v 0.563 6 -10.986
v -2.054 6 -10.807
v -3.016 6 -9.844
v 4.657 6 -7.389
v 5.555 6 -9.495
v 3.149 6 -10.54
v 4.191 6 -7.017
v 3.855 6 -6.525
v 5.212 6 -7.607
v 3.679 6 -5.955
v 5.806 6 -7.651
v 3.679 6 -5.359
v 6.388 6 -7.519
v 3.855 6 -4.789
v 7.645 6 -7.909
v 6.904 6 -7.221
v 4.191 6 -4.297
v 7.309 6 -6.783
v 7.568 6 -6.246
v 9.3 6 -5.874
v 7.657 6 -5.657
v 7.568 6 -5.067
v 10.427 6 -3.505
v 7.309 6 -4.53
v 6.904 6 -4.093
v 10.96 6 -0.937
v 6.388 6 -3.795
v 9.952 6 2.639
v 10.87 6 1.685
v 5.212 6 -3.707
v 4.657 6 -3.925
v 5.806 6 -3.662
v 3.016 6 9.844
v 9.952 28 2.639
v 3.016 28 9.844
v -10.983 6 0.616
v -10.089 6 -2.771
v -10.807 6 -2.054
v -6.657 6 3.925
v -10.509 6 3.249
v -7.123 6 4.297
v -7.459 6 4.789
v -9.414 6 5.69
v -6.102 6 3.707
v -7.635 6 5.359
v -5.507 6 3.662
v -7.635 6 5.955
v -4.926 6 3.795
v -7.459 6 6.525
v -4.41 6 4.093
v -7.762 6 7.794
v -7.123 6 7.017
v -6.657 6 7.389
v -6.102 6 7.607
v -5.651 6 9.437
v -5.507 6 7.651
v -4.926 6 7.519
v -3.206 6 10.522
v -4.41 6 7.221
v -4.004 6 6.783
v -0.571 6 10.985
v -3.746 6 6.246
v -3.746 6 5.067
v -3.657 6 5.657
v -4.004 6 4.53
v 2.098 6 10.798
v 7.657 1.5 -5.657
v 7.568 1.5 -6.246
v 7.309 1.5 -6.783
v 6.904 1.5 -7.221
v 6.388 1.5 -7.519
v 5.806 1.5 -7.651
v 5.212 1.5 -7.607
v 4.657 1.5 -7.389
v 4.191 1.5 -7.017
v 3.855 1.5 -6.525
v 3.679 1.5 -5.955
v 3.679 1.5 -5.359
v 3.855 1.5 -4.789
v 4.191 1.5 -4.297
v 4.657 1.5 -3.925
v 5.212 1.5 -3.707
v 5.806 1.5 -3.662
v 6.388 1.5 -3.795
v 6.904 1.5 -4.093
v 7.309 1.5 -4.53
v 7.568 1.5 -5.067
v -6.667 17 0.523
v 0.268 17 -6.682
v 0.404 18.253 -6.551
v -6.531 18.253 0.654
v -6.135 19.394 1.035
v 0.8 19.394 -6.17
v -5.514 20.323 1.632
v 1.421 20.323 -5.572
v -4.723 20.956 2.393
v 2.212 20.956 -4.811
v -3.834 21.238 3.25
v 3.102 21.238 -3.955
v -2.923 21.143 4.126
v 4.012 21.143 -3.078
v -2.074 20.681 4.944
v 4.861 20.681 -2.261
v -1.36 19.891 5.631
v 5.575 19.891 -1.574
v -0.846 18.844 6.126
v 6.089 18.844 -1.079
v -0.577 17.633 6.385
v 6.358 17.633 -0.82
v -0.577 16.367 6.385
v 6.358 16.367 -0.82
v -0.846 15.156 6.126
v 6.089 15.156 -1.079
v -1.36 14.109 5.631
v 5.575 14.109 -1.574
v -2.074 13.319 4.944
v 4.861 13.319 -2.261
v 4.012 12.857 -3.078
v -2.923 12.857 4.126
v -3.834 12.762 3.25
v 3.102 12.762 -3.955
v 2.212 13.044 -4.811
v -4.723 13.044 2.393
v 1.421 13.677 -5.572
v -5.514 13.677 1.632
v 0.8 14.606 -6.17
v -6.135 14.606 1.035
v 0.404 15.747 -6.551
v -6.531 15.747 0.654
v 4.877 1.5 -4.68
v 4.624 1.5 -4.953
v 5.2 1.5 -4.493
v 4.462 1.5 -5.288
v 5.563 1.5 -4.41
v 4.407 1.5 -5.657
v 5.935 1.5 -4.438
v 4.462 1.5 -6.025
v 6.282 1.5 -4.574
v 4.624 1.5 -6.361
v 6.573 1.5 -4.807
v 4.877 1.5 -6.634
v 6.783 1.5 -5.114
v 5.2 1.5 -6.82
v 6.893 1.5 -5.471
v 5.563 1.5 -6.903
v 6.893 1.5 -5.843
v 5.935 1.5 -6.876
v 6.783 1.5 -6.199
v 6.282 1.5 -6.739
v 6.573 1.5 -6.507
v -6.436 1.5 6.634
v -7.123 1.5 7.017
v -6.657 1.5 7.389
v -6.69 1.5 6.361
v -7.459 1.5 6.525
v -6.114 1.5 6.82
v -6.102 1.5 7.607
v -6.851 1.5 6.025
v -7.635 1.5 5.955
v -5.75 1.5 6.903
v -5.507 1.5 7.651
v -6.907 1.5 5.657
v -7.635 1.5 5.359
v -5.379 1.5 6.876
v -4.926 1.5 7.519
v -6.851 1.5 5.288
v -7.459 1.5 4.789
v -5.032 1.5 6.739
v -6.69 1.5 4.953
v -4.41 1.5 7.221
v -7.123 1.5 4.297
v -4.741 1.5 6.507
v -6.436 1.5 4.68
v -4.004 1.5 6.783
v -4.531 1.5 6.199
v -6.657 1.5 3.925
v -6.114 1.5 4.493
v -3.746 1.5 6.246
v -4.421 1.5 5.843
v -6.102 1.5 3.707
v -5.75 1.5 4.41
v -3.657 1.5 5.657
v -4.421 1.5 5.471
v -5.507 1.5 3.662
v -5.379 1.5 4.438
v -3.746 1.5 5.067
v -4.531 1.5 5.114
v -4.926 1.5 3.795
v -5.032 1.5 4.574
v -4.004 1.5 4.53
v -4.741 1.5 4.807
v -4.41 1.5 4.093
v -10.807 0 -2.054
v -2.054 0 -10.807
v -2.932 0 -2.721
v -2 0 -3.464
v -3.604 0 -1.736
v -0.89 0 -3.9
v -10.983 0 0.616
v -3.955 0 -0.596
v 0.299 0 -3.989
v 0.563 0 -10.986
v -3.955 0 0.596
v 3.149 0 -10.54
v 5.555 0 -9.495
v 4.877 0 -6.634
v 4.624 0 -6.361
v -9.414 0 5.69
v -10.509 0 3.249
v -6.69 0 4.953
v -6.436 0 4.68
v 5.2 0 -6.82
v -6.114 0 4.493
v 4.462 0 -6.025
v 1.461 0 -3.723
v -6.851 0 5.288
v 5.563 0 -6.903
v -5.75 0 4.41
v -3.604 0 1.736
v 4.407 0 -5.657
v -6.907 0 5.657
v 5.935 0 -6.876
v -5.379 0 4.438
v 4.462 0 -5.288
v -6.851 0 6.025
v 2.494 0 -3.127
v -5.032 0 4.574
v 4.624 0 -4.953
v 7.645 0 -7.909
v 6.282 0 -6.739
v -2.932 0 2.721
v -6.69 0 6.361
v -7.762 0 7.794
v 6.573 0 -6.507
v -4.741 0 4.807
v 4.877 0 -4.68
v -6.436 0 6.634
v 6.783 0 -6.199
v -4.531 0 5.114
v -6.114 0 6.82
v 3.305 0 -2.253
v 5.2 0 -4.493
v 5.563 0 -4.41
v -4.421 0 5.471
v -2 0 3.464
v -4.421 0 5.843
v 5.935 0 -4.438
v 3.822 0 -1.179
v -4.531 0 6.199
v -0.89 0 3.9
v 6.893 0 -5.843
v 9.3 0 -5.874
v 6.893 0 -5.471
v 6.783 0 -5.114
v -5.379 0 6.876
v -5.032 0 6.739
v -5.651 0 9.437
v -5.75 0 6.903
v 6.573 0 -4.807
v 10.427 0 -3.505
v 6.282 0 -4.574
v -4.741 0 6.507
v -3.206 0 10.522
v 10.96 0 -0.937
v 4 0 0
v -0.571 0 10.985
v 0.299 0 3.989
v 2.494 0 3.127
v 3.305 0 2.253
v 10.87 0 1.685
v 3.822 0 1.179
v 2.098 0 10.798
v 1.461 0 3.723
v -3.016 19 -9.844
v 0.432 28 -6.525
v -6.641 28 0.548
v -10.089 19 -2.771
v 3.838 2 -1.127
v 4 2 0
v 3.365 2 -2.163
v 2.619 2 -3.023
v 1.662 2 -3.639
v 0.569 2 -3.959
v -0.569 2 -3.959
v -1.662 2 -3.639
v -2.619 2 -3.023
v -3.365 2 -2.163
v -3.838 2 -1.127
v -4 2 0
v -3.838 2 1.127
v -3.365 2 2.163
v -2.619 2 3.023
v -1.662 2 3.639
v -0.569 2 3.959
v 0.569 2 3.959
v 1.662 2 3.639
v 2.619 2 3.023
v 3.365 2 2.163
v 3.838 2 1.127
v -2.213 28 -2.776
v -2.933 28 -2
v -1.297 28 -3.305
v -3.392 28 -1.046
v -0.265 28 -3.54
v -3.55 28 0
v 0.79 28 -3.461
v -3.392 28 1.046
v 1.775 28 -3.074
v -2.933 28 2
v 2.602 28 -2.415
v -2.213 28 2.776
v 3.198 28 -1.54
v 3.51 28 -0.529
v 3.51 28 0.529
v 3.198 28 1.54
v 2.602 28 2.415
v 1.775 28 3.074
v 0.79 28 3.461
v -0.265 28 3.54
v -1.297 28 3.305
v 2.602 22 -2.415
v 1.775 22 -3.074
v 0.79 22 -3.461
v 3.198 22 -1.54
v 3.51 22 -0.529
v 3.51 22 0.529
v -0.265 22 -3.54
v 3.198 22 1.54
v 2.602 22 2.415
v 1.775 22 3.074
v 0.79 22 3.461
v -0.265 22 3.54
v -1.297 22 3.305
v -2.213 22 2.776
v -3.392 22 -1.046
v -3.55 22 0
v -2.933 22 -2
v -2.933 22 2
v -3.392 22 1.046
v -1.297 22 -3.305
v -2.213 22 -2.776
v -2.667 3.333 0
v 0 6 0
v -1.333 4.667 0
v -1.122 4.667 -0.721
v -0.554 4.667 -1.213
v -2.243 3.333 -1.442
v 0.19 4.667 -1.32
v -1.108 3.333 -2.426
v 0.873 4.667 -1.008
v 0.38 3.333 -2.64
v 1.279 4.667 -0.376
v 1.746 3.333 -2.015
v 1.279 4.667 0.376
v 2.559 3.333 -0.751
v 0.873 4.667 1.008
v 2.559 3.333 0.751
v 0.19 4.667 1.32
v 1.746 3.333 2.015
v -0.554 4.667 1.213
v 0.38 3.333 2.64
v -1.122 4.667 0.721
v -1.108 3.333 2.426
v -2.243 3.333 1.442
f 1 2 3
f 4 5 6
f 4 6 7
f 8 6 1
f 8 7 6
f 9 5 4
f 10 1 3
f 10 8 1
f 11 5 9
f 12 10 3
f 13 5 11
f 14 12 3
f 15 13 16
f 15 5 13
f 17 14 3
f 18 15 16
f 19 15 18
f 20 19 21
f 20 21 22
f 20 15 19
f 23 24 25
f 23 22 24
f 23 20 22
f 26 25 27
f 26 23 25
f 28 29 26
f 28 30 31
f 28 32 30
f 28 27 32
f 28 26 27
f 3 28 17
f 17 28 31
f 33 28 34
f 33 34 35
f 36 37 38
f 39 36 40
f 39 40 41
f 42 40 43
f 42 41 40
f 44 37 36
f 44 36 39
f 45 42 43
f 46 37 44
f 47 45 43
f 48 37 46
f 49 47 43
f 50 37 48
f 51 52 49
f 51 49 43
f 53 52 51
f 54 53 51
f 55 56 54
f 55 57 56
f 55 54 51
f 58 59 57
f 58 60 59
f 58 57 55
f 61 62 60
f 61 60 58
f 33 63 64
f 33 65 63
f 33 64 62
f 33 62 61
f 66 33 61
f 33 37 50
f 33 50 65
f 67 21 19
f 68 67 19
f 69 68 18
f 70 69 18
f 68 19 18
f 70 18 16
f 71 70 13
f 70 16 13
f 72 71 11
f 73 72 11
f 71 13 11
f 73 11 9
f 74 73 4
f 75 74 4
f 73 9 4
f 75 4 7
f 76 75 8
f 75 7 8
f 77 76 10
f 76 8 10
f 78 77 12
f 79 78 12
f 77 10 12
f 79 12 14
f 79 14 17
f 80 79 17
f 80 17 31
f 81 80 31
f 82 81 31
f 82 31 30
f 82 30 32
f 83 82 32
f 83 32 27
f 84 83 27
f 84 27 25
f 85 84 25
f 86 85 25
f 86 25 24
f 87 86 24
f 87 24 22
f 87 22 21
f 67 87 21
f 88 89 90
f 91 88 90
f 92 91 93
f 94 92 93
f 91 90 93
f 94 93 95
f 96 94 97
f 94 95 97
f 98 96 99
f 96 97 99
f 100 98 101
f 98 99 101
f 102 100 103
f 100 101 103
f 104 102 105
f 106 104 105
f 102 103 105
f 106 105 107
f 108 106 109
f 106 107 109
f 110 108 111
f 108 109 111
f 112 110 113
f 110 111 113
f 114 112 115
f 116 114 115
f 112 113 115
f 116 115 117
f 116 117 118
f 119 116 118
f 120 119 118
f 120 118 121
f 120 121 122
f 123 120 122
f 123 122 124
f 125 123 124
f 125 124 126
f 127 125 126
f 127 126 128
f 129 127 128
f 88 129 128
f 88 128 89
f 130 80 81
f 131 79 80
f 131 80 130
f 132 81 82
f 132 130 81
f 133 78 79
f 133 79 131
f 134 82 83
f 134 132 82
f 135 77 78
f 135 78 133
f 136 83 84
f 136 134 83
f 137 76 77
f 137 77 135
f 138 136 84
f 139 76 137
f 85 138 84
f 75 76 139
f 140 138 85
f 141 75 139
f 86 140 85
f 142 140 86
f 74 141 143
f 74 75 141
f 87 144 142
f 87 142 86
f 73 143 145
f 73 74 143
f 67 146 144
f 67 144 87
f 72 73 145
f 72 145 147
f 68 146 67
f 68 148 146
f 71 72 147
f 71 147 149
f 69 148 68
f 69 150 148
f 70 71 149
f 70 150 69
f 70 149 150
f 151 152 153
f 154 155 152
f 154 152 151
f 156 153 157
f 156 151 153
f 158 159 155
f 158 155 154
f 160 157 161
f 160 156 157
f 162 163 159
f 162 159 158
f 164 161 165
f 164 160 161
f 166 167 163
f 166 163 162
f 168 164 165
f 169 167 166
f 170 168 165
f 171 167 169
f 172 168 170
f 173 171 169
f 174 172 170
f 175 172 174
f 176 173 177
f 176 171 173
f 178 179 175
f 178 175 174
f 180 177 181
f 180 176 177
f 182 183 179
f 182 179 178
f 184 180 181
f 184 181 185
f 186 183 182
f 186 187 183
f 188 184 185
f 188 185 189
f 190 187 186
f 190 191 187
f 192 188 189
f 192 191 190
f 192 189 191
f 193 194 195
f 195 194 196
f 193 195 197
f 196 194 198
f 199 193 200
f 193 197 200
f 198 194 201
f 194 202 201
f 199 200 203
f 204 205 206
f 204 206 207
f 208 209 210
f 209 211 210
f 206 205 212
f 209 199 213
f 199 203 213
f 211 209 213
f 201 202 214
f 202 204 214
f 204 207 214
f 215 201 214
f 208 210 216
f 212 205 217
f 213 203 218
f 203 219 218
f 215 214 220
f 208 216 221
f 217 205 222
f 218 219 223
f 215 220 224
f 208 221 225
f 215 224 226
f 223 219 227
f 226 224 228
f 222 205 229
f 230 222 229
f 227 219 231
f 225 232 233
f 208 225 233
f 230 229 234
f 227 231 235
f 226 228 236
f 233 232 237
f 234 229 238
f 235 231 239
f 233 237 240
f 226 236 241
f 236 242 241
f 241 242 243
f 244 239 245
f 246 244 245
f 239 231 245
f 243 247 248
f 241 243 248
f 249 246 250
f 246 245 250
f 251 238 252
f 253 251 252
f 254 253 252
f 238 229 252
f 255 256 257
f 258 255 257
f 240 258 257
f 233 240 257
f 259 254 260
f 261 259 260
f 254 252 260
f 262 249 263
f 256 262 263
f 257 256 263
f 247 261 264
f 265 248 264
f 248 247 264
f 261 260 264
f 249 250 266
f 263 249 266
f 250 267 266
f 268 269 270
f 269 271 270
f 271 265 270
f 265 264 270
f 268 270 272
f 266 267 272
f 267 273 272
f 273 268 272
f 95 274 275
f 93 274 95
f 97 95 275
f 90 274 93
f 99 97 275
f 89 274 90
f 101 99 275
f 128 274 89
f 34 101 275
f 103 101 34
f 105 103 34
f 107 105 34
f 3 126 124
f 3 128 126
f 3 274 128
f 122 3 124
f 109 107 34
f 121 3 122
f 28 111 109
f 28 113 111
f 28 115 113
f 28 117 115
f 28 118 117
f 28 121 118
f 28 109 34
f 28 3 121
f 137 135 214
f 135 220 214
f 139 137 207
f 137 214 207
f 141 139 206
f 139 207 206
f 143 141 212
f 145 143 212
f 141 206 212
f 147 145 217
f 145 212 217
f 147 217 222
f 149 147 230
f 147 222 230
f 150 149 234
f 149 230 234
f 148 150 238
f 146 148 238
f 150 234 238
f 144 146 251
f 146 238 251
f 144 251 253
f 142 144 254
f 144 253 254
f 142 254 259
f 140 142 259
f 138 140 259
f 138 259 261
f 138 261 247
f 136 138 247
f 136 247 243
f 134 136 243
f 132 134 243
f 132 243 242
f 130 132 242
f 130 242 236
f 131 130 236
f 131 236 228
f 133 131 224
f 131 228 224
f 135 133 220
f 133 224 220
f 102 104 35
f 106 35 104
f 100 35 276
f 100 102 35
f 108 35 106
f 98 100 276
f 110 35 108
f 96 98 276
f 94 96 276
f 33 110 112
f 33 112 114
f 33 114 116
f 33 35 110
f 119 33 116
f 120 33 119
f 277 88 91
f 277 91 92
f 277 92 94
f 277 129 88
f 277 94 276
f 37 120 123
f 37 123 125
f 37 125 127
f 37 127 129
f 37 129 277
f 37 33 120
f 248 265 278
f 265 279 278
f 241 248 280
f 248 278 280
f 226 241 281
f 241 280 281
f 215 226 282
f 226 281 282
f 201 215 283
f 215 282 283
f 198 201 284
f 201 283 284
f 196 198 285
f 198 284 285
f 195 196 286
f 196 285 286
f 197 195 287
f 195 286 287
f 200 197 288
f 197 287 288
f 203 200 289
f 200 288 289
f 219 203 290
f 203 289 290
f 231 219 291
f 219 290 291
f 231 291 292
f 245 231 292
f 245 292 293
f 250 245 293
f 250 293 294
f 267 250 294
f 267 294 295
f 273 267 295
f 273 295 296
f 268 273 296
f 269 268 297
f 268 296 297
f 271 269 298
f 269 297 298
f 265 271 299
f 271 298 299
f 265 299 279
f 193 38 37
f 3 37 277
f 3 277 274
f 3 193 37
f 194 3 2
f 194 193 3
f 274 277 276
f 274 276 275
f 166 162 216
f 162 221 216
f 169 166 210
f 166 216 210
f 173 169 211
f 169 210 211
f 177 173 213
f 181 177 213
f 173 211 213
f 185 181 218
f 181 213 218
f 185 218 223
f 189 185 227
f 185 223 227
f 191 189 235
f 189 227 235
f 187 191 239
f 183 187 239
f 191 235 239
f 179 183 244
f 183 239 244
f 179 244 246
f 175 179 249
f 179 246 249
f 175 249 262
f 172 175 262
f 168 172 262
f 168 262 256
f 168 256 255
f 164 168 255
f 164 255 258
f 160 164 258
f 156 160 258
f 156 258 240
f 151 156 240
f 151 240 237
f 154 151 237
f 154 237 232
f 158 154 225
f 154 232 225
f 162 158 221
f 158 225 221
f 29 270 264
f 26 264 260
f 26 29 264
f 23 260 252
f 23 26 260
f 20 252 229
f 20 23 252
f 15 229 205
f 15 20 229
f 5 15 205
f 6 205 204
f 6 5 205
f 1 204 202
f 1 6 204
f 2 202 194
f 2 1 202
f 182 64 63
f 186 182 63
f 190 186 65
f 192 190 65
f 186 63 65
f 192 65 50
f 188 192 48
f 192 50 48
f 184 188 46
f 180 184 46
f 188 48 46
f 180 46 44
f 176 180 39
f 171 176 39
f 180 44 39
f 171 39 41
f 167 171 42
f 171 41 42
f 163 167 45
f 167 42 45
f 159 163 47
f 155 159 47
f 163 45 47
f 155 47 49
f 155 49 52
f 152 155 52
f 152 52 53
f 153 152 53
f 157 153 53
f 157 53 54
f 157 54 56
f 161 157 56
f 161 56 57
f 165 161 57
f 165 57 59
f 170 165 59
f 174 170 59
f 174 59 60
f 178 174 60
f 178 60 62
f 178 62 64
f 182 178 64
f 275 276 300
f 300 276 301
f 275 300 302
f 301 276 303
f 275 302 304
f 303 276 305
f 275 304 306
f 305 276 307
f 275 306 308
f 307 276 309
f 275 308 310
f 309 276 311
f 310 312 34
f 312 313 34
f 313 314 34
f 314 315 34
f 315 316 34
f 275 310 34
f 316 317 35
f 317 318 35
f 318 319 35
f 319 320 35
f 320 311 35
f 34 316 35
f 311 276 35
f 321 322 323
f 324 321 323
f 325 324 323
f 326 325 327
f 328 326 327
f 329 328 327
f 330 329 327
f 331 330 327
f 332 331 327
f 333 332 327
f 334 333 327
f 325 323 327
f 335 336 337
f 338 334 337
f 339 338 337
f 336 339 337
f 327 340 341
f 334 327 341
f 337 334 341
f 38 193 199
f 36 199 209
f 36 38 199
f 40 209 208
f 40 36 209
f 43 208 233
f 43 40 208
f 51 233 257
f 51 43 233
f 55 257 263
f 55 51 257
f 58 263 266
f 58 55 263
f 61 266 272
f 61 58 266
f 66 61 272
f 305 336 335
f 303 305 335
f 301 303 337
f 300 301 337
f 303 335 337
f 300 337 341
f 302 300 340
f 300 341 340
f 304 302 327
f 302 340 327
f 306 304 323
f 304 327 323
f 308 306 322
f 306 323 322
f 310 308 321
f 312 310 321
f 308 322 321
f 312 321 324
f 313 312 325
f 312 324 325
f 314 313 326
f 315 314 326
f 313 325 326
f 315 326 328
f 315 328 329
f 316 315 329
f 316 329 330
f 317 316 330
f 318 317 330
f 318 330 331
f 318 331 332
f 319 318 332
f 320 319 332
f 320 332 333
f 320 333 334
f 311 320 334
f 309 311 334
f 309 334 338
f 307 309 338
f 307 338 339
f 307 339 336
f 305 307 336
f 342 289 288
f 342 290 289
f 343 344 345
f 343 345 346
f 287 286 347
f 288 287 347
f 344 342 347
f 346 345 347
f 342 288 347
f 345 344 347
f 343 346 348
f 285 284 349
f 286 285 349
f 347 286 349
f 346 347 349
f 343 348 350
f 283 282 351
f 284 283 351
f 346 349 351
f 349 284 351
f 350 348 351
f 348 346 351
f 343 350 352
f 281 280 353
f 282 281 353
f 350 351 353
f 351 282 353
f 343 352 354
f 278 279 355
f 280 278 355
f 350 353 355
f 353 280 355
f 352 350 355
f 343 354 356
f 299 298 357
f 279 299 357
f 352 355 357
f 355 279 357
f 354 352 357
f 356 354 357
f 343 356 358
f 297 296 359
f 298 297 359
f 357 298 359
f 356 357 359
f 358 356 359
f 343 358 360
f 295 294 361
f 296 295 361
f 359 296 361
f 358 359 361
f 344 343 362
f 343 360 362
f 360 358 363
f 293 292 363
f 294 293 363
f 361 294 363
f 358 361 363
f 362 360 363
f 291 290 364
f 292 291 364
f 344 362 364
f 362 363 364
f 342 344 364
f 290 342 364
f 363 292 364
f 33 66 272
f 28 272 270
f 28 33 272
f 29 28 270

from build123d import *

# Parameters (mm, degrees)
ESQUISSE1_W                                        = 11
ESQUISSE1_H                                        = 6
BOSS_EXTRU_1_DEPTH                                 = 22
DIAM_TRE_DU_PER_AGE_7_1_7_1_1_D                    = 7.1
DIAM_TRE_DU_PER_AGE_7_1_7_1_1_DEPTH                = 6
DIAM_TRE_DU_PER_AGE_8_5_8_5_1_D                    = 8.5
CHAMBRAGE_POUR_VIS_T_TE_HEXAGONALE_M21_D           = 2.5
CHAMBRAGE_POUR_VIS_T_TE_HEXAGONALE_M21_CBORE_D     = 4
CHAMBRAGE_POUR_VIS_T_TE_HEXAGONALE_M21_CBORE_DEPTH = 4.5
DIAM_TRE_DU_PER_AGE_8_0_8_1_D                      = 8
DIAM_TRE_DU_PER_AGE_8_0_8_1_DEPTH                  = 2
DIAM_TRE_DU_PER_AGE_8_0_8_1_TIP                    = 4
CHANFREIN1_SIZE                                    = 9
CHANFREIN1_SIZE2                                   = 4.785384885
ENL_V_MAT_EXTRU_1_DEPTH                            = 10


with BuildPart() as part:
    # Esquisse1 → Révolution1 (revolve)
    with BuildSketch(Plane(origin=(0, 0, 0), x_dir=(-1, 0, 0), z_dir=(0, 0, -1)), mode=Mode.PRIVATE) as r_volution1_sk:
        with Locations((-5.5, 3)):
            Rectangle(ESQUISSE1_W, ESQUISSE1_H)
    revolve(r_volution1_sk.sketch.rotate(Axis((0, 0, 0), (0, 1, 0)), 270), axis=Axis((0, 0, 0), (0, 1, 0)))

    # Esquisse2 → Boss.-Extru.1 (add)
    with BuildSketch(Plane(origin=(0, 6, 0), x_dir=(-1, 0, 0), z_dir=(0, 1, 0))):
        Polygon((-9.95156463, 2.63938656), (-3.016441782, 9.843834567), (10.088792211, -2.771484138), (3.016441782, -9.843834567), align=None)
    extrude(amount=BOSS_EXTRU_1_DEPTH)

    # Diamètre du perçage Ø7.1 (7.1)1
    with Locations(Plane(origin=(0, 28, 0), x_dir=(1, 0, 0), z_dir=(0, 1, 0))):
        with Locations((0, 0)):
            Hole(DIAM_TRE_DU_PER_AGE_7_1_7_1_1_D / 2, depth=DIAM_TRE_DU_PER_AGE_7_1_7_1_1_DEPTH)

    # Diamètre du perçage Ø8.5 (8.5)1 (through all)
    with Locations(Plane(origin=(-3.467561424, 0, 3.602224003), x_dir=(0.7204448006982934, 0, 0.6935122847843406), z_dir=(-0.6935122847843406, 0, 0.7204448006982934))):
        with Locations((-0.19047619, 17)):
            Hole(DIAM_TRE_DU_PER_AGE_8_5_8_5_1_D / 2)

    # Chambrage pour vis à tête hexagonale M21 (through all)
    with Locations(Plane(origin=(0, 6, 0), x_dir=(1, 0, 0), z_dir=(0, 1, 0))):
        with Locations((5.656854249, 5.656854249), (-5.656854249, -5.656854249)):
            CounterBoreHole(CHAMBRAGE_POUR_VIS_T_TE_HEXAGONALE_M21_D / 2, CHAMBRAGE_POUR_VIS_T_TE_HEXAGONALE_M21_CBORE_D / 2, CHAMBRAGE_POUR_VIS_T_TE_HEXAGONALE_M21_CBORE_DEPTH)

    # Diamètre du perçage Ø8.0 (8)1
    with Locations(Plane(origin=(0, 0, 0), x_dir=(-1, 0, 0), z_dir=(0, -1, 0))):
        with Locations((0, 0)):
            Hole(DIAM_TRE_DU_PER_AGE_8_0_8_1_D / 2, depth=DIAM_TRE_DU_PER_AGE_8_0_8_1_DEPTH)
            with Locations((0, 0, -(DIAM_TRE_DU_PER_AGE_8_0_8_1_DEPTH + DIAM_TRE_DU_PER_AGE_8_0_8_1_TIP / 2))):  # 90° drill point
                Cone(0, DIAM_TRE_DU_PER_AGE_8_0_8_1_D / 2, DIAM_TRE_DU_PER_AGE_8_0_8_1_TIP, mode=Mode.SUBTRACT)

    # Chanfrein1
    chanfrein1_edges = [part.edges().sort_by_distance(p)[0] for p in [
        (-6.552616997, 28, -6.307659352),
    ]]
    chanfrein1_side = [part.faces().sort_by_distance(p)[0] for p in [
        (-6.552616997, 17, -6.307659352),
    ]]
    chamfer(chanfrein1_edges, length=CHANFREIN1_SIZE, length2=CHANFREIN1_SIZE2, reference=chanfrein1_side[0])

    # Esquisse11 → Enlèv. mat.-Extru.1 (cut)
    with BuildSketch(Plane(origin=(0, 6, 0), x_dir=(1, 0, 0), z_dir=(0, 1, 0))):
        Polygon((1.20429729, -11.726353602), (11.620583405, -0.905551522), (15.545873169, -4.684101481), (5.129587053, -15.504903562), align=None)
        Polygon((0.545569668, 13.405846017), (-12.47793973, 0.382336619), (-16.03995118, 3.944348069), (-3.016441782, 16.967857467), align=None)
    extrude(amount=-ENL_V_MAT_EXTRU_1_DEPTH, mode=Mode.SUBTRACT)


solid = part.part
